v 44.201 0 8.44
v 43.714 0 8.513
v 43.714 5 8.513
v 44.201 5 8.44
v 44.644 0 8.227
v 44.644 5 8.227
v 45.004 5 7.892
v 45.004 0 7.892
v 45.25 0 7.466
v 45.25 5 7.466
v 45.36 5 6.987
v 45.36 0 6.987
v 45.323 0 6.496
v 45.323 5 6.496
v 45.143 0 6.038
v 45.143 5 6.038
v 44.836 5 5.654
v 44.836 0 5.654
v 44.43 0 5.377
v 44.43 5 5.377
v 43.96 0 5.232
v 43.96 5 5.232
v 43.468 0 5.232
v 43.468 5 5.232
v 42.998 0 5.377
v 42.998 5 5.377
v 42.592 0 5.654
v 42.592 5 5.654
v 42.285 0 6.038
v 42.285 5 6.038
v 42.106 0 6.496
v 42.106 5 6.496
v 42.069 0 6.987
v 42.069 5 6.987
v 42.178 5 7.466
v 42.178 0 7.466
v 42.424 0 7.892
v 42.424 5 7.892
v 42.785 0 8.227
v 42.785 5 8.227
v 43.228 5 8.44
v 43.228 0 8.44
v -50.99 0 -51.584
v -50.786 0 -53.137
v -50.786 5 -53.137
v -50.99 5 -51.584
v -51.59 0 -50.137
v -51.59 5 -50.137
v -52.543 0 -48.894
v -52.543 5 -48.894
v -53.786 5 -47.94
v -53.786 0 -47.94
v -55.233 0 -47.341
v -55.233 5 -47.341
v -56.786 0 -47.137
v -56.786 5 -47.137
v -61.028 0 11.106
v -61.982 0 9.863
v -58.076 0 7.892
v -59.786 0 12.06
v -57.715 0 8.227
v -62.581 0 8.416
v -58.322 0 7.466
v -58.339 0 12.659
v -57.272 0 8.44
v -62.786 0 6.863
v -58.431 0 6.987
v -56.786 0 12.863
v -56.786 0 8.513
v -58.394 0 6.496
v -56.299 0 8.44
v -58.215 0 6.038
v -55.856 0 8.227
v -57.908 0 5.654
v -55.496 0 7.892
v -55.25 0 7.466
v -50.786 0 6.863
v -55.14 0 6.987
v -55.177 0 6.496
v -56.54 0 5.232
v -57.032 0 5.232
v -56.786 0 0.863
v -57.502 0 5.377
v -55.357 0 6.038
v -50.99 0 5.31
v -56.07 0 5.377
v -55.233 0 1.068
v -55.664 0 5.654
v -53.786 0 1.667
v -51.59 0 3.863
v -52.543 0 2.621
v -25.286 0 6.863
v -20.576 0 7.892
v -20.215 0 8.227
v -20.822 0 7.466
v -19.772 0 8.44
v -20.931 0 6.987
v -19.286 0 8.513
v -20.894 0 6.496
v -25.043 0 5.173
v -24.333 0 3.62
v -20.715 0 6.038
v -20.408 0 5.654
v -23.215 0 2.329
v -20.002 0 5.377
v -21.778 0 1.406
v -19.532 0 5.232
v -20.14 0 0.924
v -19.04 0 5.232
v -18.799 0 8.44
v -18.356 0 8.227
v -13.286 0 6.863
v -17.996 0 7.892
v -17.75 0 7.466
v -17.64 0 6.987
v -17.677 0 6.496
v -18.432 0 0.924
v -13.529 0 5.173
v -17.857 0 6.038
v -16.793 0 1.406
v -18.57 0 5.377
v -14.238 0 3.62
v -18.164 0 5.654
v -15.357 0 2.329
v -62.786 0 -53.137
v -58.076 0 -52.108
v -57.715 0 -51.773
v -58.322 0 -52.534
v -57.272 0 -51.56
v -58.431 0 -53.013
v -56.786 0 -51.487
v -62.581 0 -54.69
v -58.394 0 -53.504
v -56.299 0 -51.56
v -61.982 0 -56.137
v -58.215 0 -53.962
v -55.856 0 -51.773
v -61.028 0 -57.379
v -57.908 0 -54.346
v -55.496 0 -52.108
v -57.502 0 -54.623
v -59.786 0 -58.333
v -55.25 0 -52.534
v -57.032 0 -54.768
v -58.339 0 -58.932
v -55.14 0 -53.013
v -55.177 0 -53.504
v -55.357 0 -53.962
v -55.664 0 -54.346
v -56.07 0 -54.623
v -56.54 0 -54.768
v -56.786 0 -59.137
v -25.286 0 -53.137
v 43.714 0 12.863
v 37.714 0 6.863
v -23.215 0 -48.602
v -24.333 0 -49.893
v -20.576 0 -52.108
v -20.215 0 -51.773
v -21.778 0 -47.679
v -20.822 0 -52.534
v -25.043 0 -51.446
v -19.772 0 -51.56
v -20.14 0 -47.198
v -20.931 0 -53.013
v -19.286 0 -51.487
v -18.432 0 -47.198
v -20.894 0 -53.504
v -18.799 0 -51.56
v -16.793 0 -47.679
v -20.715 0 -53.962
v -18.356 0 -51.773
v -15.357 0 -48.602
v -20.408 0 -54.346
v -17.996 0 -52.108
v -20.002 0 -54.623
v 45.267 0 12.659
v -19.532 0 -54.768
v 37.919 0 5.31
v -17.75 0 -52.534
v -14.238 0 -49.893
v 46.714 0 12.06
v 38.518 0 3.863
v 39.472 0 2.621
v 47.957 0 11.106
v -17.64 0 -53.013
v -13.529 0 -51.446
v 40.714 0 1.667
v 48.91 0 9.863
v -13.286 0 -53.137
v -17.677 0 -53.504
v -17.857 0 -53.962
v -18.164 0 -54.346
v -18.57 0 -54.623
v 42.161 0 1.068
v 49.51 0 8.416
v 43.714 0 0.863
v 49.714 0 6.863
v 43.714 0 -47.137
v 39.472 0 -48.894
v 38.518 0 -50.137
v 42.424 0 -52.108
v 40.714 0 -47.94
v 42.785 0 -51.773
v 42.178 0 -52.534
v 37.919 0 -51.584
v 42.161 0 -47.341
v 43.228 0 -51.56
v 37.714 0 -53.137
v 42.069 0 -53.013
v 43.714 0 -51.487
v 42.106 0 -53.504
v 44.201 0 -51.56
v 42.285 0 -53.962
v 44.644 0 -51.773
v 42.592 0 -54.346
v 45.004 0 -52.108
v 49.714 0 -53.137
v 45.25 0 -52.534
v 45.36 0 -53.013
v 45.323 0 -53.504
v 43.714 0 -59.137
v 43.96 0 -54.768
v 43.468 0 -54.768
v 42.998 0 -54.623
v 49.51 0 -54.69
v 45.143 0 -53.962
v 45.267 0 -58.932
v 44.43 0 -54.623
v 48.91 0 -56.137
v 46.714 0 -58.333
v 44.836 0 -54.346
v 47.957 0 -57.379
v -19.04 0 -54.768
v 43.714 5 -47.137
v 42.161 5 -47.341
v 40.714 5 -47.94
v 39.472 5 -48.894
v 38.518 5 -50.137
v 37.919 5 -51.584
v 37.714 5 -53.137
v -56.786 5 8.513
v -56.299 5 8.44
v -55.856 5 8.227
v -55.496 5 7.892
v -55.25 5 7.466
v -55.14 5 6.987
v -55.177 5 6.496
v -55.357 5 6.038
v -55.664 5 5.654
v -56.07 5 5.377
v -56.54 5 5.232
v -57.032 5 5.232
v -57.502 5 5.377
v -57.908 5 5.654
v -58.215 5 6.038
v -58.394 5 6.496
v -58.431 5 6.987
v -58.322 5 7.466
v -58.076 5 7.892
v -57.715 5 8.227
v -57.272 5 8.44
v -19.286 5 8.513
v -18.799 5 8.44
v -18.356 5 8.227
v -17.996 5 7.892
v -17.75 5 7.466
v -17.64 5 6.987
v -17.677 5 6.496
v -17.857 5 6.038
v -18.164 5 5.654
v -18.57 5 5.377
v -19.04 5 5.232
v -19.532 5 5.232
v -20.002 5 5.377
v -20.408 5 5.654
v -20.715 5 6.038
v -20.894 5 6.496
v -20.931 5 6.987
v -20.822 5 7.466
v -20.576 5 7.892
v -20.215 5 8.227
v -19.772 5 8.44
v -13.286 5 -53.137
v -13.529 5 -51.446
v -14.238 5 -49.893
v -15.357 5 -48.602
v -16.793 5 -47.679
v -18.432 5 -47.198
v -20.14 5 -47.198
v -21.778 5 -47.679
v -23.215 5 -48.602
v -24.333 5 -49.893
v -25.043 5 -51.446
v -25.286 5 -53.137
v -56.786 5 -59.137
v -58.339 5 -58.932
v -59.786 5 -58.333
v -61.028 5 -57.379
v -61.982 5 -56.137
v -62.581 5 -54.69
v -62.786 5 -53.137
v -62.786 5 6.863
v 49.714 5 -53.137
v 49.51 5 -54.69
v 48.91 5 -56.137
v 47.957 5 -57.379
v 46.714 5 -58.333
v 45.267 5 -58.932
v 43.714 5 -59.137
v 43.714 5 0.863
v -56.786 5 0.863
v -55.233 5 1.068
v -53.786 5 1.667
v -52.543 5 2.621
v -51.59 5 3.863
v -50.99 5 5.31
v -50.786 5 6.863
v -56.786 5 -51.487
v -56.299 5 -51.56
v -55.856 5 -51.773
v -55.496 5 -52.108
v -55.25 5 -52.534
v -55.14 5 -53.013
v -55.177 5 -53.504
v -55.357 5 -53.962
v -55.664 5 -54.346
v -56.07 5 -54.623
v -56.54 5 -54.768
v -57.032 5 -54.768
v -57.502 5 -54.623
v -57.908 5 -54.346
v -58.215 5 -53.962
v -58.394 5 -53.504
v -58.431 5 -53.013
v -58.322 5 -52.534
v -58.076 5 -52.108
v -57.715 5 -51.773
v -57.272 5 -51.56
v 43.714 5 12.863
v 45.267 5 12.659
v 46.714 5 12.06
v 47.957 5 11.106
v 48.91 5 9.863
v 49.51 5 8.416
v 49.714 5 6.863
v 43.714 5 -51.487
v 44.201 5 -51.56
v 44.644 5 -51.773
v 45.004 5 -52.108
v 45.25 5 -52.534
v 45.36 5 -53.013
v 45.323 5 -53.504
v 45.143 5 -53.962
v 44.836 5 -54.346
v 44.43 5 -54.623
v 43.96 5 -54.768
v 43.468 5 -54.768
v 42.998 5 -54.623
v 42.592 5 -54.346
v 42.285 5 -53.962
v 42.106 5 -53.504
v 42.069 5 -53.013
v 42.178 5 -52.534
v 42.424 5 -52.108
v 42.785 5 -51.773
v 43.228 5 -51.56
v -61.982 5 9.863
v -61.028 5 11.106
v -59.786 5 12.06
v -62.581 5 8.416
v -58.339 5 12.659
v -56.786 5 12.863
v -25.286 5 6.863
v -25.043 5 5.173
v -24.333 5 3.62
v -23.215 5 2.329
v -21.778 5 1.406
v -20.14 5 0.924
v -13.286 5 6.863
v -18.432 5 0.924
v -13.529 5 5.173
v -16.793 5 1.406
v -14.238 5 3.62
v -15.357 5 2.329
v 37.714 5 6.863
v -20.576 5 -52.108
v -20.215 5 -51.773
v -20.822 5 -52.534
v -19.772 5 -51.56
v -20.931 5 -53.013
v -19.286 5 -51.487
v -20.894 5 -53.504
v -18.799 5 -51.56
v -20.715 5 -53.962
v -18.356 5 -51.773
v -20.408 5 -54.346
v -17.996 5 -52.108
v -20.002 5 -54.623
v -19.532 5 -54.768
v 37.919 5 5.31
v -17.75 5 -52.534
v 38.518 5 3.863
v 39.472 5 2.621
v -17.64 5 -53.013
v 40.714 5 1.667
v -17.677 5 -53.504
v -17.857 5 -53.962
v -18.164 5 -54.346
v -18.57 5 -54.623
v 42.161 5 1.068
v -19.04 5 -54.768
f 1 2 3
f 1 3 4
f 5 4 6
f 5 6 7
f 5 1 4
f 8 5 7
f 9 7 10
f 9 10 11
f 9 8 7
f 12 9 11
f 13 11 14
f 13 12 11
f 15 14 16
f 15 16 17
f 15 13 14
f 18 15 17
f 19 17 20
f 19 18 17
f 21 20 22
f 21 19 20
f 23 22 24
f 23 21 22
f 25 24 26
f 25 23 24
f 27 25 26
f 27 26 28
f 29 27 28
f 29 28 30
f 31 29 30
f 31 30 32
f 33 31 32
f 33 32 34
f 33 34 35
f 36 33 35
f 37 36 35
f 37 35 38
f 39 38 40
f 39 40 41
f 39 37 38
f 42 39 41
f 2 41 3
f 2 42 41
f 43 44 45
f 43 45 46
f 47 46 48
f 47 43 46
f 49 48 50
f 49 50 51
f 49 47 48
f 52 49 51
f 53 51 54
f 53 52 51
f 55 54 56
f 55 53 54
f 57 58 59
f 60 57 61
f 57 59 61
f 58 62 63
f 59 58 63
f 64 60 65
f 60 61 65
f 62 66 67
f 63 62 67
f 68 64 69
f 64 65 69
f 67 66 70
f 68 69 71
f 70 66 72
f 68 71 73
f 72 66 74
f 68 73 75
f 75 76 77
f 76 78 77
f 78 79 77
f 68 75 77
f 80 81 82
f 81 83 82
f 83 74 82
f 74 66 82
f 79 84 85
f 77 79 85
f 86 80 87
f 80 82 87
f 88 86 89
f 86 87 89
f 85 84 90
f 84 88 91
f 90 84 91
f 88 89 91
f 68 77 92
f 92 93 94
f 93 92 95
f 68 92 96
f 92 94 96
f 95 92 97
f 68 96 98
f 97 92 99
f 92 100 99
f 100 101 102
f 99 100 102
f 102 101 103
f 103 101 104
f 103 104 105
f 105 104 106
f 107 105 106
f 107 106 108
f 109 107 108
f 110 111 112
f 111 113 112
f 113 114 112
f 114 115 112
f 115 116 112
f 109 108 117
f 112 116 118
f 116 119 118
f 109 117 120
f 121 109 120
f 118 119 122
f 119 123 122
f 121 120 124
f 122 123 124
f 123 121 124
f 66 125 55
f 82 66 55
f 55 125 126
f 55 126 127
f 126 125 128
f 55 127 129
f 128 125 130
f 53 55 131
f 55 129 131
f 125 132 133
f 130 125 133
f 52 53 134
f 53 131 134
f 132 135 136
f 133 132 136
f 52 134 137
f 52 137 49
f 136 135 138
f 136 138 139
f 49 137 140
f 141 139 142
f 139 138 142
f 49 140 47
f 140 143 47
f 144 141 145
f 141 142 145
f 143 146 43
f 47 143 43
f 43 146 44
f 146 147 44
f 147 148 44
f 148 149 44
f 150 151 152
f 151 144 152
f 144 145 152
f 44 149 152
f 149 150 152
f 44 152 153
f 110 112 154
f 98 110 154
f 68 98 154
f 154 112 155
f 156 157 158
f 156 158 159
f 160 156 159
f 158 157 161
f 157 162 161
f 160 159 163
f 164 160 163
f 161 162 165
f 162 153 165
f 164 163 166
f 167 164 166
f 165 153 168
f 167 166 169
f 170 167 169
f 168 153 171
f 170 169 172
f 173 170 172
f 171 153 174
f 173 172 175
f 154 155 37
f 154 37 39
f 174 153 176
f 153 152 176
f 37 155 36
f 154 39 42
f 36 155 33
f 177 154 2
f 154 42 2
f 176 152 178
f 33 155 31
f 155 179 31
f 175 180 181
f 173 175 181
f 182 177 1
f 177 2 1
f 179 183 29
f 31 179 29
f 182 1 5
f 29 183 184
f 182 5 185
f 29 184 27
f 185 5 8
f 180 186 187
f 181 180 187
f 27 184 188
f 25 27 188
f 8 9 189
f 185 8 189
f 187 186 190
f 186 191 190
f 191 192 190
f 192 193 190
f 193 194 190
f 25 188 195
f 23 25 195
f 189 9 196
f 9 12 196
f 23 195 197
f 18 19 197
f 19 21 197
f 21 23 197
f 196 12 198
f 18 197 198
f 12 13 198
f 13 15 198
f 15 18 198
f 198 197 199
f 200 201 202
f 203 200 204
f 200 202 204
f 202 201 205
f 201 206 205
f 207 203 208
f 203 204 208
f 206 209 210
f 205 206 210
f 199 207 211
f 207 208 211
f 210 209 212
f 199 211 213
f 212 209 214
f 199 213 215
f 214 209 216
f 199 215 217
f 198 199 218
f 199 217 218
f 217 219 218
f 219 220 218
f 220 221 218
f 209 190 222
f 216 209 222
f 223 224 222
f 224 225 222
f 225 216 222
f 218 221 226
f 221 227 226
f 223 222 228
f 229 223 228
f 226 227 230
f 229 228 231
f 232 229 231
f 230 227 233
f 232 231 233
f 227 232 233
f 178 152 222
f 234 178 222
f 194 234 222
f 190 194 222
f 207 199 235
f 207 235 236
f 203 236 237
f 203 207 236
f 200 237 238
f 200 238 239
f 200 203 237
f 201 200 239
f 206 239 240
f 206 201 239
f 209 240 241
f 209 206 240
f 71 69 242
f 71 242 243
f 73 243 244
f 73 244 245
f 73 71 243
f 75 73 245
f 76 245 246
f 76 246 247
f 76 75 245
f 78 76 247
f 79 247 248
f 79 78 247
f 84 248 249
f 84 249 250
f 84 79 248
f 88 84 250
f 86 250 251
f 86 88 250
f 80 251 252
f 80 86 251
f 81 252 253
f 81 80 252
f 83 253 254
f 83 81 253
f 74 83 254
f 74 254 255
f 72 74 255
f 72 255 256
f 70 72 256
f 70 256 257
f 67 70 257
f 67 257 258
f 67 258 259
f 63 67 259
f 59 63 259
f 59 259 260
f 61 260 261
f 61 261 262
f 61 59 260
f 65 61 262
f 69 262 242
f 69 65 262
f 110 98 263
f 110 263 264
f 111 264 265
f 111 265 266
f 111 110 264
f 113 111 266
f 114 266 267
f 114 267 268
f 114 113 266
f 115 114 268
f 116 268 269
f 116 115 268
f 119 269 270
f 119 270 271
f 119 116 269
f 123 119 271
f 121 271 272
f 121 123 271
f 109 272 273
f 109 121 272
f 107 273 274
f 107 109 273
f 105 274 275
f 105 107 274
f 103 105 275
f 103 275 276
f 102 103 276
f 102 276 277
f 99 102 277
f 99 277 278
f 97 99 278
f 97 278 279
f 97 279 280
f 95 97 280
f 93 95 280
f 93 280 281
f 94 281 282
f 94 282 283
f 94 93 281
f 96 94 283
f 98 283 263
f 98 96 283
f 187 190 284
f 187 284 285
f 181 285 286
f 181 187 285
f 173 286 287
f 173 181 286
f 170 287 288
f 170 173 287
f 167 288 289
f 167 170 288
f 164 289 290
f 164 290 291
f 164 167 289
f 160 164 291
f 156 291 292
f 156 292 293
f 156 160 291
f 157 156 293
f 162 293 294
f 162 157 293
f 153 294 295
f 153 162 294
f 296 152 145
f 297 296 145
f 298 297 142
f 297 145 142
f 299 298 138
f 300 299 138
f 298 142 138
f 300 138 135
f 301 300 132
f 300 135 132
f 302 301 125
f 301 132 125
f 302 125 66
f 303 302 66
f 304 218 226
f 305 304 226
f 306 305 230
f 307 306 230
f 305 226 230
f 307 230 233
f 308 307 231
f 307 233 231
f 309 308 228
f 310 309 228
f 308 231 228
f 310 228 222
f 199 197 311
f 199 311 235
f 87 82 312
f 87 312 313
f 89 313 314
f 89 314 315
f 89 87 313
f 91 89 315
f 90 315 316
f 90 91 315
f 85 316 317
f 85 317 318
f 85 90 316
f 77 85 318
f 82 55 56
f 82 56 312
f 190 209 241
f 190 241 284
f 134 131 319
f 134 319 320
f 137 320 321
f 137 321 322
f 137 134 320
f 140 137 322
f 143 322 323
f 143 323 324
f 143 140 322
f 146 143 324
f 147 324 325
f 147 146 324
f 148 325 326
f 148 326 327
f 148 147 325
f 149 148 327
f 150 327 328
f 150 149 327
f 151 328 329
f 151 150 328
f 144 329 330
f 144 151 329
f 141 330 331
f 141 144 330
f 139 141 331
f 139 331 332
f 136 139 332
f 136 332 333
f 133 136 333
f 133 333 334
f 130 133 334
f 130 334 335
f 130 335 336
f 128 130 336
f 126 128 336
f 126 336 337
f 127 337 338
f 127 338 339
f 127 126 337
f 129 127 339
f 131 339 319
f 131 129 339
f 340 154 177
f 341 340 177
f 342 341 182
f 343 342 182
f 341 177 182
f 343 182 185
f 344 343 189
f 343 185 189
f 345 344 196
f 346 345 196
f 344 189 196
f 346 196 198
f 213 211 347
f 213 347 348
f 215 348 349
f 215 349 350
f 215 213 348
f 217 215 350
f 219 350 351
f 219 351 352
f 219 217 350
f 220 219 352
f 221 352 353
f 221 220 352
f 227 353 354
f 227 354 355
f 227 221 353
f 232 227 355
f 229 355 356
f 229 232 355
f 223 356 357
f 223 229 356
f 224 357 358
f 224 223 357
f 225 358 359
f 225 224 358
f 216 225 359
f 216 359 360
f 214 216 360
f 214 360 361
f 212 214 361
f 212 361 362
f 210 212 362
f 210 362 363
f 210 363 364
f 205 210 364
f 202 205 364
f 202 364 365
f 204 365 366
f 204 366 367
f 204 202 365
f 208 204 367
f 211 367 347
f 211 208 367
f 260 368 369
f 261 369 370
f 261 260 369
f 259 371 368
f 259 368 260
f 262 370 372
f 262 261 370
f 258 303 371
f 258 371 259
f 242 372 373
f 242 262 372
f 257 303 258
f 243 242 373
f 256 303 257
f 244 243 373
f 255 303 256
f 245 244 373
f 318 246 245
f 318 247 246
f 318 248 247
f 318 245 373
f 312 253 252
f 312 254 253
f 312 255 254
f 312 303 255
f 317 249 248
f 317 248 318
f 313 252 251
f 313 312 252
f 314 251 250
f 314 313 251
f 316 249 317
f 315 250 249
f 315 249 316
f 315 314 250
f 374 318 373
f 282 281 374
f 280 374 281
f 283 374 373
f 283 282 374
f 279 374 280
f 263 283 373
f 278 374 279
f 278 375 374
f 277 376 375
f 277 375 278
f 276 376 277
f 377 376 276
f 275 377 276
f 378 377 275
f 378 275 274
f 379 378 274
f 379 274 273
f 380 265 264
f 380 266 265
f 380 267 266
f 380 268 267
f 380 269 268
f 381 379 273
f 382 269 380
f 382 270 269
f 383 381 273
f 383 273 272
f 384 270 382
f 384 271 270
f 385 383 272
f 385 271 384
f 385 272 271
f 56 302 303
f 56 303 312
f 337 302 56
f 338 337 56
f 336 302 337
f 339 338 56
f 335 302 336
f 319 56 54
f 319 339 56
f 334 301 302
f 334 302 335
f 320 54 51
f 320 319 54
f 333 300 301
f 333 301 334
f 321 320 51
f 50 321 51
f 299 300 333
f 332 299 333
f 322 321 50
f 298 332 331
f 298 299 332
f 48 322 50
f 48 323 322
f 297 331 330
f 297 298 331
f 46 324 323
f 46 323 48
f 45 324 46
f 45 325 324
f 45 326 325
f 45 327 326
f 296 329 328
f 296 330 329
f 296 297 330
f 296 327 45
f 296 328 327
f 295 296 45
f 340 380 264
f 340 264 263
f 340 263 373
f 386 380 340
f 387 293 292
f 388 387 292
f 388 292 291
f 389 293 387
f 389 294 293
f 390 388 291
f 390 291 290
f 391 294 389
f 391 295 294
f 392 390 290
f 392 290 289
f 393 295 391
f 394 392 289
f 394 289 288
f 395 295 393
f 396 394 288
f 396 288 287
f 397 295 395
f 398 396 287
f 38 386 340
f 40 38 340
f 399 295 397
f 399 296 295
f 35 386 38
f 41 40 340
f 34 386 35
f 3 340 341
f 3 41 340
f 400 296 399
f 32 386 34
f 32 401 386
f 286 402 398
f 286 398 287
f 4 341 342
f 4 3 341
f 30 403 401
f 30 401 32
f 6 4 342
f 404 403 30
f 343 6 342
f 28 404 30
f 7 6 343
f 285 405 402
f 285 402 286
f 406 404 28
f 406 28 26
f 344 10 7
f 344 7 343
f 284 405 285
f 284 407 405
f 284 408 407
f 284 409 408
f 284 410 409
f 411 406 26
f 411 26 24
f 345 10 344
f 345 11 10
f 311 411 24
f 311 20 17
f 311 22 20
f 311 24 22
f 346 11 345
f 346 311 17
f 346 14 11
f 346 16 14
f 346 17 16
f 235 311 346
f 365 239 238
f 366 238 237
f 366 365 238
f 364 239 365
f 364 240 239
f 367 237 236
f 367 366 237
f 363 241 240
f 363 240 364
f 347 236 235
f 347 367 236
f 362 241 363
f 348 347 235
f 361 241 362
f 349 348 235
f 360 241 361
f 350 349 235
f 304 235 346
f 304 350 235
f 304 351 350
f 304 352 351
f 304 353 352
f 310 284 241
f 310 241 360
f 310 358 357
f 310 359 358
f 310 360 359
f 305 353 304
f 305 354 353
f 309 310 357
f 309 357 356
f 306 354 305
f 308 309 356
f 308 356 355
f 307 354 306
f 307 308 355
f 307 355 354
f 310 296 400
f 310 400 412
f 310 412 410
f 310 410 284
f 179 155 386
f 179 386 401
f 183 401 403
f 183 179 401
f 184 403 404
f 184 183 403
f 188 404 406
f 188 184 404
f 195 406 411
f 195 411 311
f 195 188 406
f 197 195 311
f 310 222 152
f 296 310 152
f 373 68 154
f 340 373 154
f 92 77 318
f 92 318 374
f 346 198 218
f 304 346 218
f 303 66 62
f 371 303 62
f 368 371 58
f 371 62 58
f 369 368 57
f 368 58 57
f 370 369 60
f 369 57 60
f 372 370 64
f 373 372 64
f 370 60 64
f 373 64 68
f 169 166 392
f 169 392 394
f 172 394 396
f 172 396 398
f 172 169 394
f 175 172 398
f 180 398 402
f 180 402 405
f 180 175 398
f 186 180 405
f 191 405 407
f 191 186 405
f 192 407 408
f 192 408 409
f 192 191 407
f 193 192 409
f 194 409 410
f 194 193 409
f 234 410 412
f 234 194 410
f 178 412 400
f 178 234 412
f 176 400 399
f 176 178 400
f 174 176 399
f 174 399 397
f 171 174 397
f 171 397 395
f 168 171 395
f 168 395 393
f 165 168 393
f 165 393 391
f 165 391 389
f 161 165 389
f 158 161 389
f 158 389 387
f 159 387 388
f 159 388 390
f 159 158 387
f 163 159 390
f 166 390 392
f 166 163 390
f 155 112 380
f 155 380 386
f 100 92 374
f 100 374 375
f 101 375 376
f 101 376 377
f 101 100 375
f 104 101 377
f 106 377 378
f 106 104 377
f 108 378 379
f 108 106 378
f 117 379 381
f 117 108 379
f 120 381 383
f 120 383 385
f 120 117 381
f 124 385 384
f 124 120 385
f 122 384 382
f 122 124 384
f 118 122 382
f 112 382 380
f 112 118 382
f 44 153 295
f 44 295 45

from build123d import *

# Parameters (mm, degrees)
SKETCH_1_R      = 1.65
EXTRUDE_1_DEPTH = 5


with BuildPart() as part:
    # 草图1 → 凸台-拉伸1 (new body)
    with BuildSketch(Plane(origin=(0, 0, 0), x_dir=(1, 0, 0), z_dir=(0, 1, 0))):
        with BuildLine():
            Line((-62.785835682, 53.136639907), (-62.785835682, -6.863360093))
            ThreePointArc((-62.785835682, -6.863360093), (-61.028476369, -11.10600078), (-56.785835682, -12.863360093))
            Line((-56.785835682, -12.863360093), (43.714164318, -12.863360093))
            ThreePointArc((43.714164318, -12.863360093), (47.956805005, -11.10600078), (49.714164318, -6.863360093))
            Line((49.714164318, -6.863360093), (49.714164318, 53.136639907))
            ThreePointArc((49.714164318, 53.136639907), (47.956805005, 57.379280594), (43.714164318, 59.136639907))
            Line((43.714164318, 59.136639907), (-56.785835682, 59.136639907))
            ThreePointArc((-56.785835682, 59.136639907), (-61.028476369, 57.379280594), (-62.785835682, 53.136639907))
        make_face()
        with Locations(Location((-56.785835682, 53.136639907, 0), (0, 0, 270))):
            Circle(SKETCH_1_R, mode=Mode.SUBTRACT)
        with Locations(Location((-19.285835682, 53.136639907, 0), (0, 0, 270))):
            Circle(SKETCH_1_R, mode=Mode.SUBTRACT)
        with Locations(Location((43.714164318, 53.136639907, 0), (0, 0, 270))):
            Circle(SKETCH_1_R, mode=Mode.SUBTRACT)
        with Locations(Location((-56.785835682, -6.863360093, 0), (0, 0, 270))):
            Circle(SKETCH_1_R, mode=Mode.SUBTRACT)
        with Locations(Location((-19.285835682, -6.863360093, 0), (0, 0, 270))):
            Circle(SKETCH_1_R, mode=Mode.SUBTRACT)
        with Locations(Location((43.714164318, -6.863360093, 0), (0, 0, 270))):
            Circle(SKETCH_1_R, mode=Mode.SUBTRACT)
        with BuildLine():
            Line((-50.785835682, -6.863360093), (-25.285835682, -6.863360093))
            ThreePointArc((-25.285835682, -6.863360093), (-19.285835682, -0.863360093), (-13.285835682, -6.863360093))
            Line((-13.285835682, -6.863360093), (37.714164318, -6.863360093))
            ThreePointArc((37.714164318, -6.863360093), (39.471523631, -2.620719406), (43.714164318, -0.863360093))
            Line((43.714164318, -0.863360093), (43.714164318, 47.136639907))
            ThreePointArc((43.714164318, 47.136639907), (39.471523631, 48.89399922), (37.714164318, 53.136639907))
            Line((37.714164318, 53.136639907), (-13.285835682, 53.136639907))
            ThreePointArc((-13.285835682, 53.136639907), (-19.285835682, 47.136639907), (-25.285835682, 53.136639907))
            Line((-25.285835682, 53.136639907), (-50.785835682, 53.136639907))
            ThreePointArc((-50.785835682, 53.136639907), (-52.543194995, 48.89399922), (-56.785835682, 47.136639907))
            Line((-56.785835682, 47.136639907), (-56.785835682, -0.863360093))
            ThreePointArc((-56.785835682, -0.863360093), (-52.543194995, -2.620719406), (-50.785835682, -6.863360093))
        make_face(mode=Mode.SUBTRACT)
    extrude(amount=EXTRUDE_1_DEPTH)


solid = part.part
